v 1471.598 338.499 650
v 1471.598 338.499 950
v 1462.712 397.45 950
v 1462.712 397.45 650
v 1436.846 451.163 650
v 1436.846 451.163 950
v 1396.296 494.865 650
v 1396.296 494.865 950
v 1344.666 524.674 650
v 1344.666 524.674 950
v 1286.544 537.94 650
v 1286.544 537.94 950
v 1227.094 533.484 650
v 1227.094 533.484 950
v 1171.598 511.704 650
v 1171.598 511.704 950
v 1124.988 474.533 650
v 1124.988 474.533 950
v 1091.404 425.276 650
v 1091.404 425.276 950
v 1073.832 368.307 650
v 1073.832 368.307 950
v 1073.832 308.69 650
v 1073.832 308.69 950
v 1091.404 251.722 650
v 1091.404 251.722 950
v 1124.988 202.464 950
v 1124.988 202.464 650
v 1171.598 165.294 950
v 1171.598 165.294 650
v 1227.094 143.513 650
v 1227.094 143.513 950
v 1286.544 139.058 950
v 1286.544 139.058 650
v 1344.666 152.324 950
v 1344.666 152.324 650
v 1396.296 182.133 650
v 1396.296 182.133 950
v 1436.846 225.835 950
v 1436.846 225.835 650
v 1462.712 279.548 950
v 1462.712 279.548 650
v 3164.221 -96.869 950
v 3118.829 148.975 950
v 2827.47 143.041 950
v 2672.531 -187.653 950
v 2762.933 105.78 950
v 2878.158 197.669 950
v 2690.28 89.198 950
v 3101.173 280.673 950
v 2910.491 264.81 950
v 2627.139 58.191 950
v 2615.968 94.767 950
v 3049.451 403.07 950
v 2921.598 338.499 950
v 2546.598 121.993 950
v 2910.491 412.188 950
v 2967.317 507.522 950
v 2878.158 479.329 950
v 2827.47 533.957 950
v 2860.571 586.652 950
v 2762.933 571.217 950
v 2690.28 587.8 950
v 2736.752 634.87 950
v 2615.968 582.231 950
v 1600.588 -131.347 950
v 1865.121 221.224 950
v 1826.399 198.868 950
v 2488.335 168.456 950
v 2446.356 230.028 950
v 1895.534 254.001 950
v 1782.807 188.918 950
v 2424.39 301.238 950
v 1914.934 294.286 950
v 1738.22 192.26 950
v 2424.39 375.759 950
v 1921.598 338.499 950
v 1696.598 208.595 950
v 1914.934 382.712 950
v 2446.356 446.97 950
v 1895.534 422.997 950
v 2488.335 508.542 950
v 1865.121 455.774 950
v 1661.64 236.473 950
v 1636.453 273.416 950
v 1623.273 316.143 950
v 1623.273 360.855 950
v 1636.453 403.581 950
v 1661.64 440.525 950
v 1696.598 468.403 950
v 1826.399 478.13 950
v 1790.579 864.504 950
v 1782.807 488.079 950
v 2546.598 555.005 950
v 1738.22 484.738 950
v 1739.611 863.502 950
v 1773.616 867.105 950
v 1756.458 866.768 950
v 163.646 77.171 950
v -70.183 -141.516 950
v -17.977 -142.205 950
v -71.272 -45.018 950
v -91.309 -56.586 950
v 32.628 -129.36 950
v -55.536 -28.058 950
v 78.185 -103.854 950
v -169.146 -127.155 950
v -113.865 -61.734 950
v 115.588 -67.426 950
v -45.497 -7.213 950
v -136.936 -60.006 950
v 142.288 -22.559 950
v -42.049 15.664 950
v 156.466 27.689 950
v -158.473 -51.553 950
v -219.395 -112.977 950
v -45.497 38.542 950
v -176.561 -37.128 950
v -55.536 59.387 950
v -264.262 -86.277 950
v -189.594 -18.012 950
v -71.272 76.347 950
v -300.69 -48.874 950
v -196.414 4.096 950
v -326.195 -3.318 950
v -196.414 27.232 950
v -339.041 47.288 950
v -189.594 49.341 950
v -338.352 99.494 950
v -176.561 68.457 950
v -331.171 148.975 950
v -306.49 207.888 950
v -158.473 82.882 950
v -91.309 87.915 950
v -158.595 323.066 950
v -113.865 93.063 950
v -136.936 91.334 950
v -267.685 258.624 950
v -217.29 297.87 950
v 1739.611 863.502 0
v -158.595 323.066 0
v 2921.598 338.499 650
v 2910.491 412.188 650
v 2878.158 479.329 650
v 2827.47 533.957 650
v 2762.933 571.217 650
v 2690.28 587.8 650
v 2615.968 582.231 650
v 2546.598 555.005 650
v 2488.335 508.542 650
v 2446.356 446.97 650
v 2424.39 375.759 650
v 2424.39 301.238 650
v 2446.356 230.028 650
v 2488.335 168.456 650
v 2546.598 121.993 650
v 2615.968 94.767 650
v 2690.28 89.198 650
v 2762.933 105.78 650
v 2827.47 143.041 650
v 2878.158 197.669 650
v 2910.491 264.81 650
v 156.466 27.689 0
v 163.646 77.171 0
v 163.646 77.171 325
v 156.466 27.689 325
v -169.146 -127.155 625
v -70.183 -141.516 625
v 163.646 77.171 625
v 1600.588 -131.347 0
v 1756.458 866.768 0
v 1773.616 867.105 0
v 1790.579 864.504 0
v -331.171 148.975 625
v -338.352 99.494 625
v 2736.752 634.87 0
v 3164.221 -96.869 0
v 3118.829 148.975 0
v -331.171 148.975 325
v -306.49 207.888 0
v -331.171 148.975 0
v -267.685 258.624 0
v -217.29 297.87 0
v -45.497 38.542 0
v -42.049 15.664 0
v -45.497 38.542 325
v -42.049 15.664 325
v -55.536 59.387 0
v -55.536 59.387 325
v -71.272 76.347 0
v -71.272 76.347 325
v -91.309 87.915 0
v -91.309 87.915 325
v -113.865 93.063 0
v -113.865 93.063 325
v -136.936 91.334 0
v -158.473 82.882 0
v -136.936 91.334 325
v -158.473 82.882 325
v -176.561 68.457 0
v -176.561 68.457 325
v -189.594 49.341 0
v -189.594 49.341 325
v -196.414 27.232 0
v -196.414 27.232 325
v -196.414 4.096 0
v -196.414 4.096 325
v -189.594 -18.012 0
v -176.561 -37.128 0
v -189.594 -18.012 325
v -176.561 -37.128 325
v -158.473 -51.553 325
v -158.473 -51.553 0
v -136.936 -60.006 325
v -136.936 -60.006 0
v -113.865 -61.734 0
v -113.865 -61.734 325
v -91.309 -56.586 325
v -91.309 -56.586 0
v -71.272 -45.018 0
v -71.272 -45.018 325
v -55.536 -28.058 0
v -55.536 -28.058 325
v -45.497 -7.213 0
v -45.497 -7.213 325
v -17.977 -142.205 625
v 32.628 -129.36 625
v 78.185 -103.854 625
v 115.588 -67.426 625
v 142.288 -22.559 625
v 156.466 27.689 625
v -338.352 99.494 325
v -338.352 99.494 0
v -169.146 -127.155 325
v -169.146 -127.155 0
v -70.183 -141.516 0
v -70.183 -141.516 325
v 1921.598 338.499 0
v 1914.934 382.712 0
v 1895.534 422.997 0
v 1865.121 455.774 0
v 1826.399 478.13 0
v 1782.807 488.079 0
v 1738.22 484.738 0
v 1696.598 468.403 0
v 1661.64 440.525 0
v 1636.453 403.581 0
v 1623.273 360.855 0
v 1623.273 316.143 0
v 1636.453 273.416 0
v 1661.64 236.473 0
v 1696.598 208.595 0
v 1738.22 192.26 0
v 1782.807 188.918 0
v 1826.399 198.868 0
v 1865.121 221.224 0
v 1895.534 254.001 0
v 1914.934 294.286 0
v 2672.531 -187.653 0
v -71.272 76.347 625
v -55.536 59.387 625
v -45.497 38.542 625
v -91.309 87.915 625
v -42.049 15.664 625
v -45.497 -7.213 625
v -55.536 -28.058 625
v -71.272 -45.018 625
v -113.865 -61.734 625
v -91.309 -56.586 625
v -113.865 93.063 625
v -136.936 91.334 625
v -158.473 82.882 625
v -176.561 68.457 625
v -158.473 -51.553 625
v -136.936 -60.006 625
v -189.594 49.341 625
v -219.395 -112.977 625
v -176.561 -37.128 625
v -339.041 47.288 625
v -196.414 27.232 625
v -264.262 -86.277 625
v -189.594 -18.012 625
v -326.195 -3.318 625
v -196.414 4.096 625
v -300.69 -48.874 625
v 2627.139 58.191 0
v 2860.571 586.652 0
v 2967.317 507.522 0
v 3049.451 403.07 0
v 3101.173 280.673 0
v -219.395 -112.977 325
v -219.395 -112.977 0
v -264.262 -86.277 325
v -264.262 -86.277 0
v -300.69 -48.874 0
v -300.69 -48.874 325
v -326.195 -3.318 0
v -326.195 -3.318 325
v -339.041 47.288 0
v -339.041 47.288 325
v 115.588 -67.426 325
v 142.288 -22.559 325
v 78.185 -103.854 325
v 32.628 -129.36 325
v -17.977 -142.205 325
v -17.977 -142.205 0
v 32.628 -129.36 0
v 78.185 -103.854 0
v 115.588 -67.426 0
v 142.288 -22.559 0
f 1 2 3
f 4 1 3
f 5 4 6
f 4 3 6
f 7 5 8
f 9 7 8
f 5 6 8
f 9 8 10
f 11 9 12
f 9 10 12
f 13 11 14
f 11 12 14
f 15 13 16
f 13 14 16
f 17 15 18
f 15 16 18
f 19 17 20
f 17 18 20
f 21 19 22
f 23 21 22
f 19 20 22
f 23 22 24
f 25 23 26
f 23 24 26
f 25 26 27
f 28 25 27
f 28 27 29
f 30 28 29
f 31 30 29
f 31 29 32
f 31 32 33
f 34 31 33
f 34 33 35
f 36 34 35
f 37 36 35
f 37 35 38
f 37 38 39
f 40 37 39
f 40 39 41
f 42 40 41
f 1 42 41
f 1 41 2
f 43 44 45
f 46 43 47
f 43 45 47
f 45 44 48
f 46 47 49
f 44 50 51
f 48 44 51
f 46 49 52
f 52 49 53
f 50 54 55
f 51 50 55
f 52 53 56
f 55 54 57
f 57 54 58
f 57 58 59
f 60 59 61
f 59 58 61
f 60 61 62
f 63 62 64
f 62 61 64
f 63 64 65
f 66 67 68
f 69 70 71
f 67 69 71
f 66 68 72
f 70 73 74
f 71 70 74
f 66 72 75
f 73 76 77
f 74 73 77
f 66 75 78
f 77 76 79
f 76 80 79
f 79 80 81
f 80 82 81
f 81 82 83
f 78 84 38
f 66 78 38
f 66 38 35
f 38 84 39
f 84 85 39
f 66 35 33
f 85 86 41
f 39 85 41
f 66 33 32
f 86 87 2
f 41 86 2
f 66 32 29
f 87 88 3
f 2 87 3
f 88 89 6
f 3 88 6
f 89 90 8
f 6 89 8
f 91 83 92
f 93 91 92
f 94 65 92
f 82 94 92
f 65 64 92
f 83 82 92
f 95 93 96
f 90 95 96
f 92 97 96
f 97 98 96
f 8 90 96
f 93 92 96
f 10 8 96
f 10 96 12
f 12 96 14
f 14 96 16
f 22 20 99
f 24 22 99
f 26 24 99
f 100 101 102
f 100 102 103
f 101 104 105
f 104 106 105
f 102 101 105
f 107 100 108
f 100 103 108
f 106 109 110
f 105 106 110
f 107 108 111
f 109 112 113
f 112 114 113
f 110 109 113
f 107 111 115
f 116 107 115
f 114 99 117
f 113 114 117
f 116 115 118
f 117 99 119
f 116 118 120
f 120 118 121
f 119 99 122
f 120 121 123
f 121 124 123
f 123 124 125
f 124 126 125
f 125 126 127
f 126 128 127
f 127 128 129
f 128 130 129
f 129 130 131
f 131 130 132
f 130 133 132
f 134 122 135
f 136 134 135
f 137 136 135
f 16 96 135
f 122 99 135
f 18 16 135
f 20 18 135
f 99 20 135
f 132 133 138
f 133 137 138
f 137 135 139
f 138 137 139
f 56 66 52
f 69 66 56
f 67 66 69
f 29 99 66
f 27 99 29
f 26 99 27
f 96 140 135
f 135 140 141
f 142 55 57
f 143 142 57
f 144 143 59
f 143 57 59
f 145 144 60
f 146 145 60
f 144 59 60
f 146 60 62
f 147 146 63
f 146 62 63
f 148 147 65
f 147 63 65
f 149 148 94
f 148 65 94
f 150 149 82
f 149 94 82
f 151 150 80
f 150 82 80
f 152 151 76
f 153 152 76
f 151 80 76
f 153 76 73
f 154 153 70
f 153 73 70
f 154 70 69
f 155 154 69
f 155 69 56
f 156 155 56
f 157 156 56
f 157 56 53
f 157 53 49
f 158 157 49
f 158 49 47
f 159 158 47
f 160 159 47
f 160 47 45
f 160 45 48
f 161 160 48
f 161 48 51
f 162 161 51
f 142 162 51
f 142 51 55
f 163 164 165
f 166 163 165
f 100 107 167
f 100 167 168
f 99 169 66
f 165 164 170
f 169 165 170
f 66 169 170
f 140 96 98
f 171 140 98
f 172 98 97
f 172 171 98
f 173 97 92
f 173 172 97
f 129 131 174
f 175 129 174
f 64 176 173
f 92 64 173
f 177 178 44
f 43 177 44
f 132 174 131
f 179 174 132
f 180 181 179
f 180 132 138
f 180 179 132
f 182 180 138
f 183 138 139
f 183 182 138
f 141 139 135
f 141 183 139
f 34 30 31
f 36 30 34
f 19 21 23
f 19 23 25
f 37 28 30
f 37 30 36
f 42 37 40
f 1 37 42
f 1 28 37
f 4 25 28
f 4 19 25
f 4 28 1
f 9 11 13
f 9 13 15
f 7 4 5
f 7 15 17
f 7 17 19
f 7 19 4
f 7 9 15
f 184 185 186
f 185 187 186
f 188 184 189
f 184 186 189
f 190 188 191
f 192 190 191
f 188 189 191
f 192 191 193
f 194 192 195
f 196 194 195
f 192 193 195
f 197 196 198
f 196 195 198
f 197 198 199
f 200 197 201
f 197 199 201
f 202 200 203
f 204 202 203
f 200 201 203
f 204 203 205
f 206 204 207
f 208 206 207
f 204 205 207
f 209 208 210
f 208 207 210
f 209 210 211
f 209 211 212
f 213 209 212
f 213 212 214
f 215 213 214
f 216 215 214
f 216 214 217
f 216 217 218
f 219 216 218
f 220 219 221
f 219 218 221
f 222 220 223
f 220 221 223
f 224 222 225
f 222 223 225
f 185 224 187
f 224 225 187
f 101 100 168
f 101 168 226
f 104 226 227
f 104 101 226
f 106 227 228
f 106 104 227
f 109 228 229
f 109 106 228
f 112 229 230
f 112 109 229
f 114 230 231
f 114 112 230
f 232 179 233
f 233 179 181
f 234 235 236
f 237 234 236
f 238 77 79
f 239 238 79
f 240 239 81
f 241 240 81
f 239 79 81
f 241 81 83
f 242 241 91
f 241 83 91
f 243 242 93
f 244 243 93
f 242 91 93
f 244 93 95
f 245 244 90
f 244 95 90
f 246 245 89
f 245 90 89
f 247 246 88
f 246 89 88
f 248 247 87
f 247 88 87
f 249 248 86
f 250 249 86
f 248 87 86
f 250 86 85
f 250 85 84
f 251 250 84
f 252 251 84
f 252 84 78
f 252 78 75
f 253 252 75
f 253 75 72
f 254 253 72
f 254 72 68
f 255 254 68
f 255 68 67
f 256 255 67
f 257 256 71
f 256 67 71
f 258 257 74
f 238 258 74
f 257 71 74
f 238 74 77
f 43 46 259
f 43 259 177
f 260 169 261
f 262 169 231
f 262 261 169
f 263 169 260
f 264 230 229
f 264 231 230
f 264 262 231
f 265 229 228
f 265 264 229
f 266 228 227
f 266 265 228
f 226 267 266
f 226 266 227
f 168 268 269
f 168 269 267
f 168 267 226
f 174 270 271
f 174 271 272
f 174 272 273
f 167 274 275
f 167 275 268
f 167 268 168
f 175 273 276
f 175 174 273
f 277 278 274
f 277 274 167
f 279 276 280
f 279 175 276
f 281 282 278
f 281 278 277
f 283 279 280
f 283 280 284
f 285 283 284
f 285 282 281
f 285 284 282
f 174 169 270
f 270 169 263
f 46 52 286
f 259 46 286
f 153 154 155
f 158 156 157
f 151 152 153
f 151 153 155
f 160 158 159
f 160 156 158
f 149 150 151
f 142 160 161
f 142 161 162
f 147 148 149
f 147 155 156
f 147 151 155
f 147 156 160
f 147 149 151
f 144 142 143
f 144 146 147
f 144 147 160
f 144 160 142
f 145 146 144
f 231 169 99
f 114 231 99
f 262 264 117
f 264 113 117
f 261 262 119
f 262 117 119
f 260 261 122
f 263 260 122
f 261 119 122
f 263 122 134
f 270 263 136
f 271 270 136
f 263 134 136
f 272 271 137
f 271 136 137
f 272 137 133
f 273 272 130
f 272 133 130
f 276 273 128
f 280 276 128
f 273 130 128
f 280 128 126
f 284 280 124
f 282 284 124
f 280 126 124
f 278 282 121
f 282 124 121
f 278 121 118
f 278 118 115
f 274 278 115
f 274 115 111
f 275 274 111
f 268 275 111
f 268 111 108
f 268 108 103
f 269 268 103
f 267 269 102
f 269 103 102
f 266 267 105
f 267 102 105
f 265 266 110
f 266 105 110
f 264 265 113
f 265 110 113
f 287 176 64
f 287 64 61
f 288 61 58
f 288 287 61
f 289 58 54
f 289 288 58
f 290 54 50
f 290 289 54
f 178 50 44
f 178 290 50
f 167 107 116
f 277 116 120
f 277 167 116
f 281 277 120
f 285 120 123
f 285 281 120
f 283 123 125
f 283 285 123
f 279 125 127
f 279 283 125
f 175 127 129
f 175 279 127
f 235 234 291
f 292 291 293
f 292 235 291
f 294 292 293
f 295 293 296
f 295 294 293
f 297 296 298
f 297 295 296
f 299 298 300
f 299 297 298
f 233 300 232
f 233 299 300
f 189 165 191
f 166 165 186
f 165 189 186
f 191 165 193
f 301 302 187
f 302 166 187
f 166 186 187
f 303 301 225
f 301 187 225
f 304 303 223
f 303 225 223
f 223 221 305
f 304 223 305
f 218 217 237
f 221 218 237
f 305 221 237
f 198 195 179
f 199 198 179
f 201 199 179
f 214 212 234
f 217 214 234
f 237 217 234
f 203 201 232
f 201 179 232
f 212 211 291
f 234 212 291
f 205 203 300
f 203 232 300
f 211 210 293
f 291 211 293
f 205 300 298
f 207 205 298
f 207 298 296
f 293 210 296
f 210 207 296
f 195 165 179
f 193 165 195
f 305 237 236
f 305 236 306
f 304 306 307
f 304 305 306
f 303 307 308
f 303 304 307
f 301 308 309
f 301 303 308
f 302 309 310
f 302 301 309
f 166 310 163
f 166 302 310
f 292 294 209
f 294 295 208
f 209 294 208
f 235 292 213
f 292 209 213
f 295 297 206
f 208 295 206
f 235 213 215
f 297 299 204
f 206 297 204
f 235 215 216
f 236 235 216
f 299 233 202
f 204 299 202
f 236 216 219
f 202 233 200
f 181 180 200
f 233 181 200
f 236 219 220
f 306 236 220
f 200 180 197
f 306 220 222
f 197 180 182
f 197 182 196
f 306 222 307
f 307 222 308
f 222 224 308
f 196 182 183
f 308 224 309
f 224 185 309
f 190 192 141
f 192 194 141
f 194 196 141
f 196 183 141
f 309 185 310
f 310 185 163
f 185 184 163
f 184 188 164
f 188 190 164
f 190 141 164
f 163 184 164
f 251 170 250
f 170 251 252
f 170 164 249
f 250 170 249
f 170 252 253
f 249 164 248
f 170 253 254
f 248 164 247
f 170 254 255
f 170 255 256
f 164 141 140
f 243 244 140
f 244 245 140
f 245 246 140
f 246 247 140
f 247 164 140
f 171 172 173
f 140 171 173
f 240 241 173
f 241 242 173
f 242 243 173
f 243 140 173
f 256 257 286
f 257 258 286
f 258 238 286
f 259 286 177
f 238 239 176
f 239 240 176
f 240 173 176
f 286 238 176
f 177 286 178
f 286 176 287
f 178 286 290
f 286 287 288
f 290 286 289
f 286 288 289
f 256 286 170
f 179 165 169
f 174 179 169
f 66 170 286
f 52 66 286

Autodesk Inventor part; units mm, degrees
ref_plane "YZ Plane" through (0, 0, 0) normal (1, 0, 0) x (0, 1, 0)
ref_plane "XZ Plane" through (0, 0, 0) normal (0, 1, 0) x (-1, 0, 0)
ref_plane "XY Plane" through (0, 0, 0) normal (0, 0, 1) x (1, 0, 0)
sketch "Skizze1" plane through (0, 0, 0) normal (0, 0, 1) x (1, 0, 0)
  arc A0 (3118.8287, 148.9752) -> (2736.7523, 634.8703) centre (2618.8287, 148.9752) ccw
  line L0 (2736.7523, 634.8703) -> (1790.5787, 864.5036)
  line L1 (1739.6109, 863.5025) -> (-158.5948, 323.0655)
  arc A1 (-158.5948, 323.0655) -> (-331.1713, 148.9752) centre (-90.1379, 82.6208) ccw
  arc A2 (1765.4752, 870.5961) -> (1764.4558, 870.5761) centre (1765.0035, 868.6526) ccw
  arc A3 (1790.5787, 864.5036) -> (1739.6109, 863.5025) centre (1766.9937, 767.3247) ccw
  line L2 (-331.1713, 148.9752) -> (1600.5878, -131.3474)
  line L3 (1600.5878, -131.3474) -> (3118.8287, 148.9752)
  point P0 (0, 0)
  point P1 (1764.9629, 870.7205)
  dimension "d1" = 1000
  dimension "d2" = 2000
  dimension "d3" = 500
  dimension "d4" = 250
extrude "Extrusion1" add sketch "Skizze1" along normal blind 950
sketch "Skizze2" plane through (3118.8287, 148.9752, 0) normal (0.1815675, -0.9833785, 0) x (0.9833785, 0.1815675, 0)
  line L0 (-1543.9029, 950) -> (0, 950) construction
  line L1 (-1543.9029, 0) -> (0, 0) construction
  line L2 (0, 950) -> (-500, 950)
  line L3 (-500, 950) -> (-500, 0)
  line L4 (-500, 0) -> (0, 0)
  line L5 (0, 0) -> (0, 950)
  line L6 (-3191.3386, 950) -> (-3392.6558, 950) projected
  line L7 (-1226.5582, 0) -> (-3191.3386, 0) construction
  line L8 (-3392.6558, 950) -> (-2892.6558, 950)
  line L9 (-2892.6558, 950) -> (-2892.6558, 0)
  line L10 (-2892.6558, 0) -> (-3392.6558, 0)
  line L11 (-3392.6558, 0) -> (-3392.6558, 950)
  point P0 (-3094.0381, 0)
  dimension "d16" = 500
  dimension "d17" = 500
extrude "Extrusion2" add sketch "Skizze2" along normal blind 250 contours L5 L4 L3 L2
sketch "Skizze3" plane through (1600.5878, -131.3474, 0) normal (-0.1436085, -0.9896346, 0) x (0.9896346, -0.1436085, 0)
  line L0 (-1951.9923, 0) -> (0, 0) construction
  line L1 (-1951.9923, 950) -> (0, 950) construction
  line L2 (-1951.9923, 0) -> (-1451.9923, 0)
  line L3 (-1451.9923, 0) -> (-1451.9923, 950)
  line L4 (-1451.9923, 950) -> (-1951.9923, 950)
  line L5 (-1951.9923, 950) -> (-1951.9923, 0)
  point P0 (-1602.8597, 0)
  dimension "d20" = 500
extrude "Extrusion3" add sketch "Skizze3" along normal blind 250
sketch "Skizze4" plane through (-331.1713, 148.9752, 0) normal (-0.9896346, 0.1436085, 0) x (0, 0, 1)
  line L0 (0, 0) -> (0, 197.0692) construction
  line L1 (950, 0) -> (950, -250) projected
  line L2 (0, 0) -> (950, 0)
  line L3 (950, 0) -> (950, -250)
  line L4 (950, -250) -> (0, -250)
  line L5 (0, -250) -> (0, 0)
  point P0 (0, -99.872)
sketch "Skizze5" plane through (0, 0, 950) normal (0, 0, 1) x (1, 0, 0)
  line L0 (163.646, 77.171) -> (1600.5878, -131.3474) construction
  line L1 (1600.5878, -131.3474) -> (2100.5878, -131.3474) construction
  circle A0 centre (1771.5979, 338.4989) radius 150
  point P0 (0, 0)
  dimension "d25" = 300
extrude "Extrusion4" cut sketch "Skizze5" against normal through all
sketch "Skizze6" plane through (0, 0, 950) normal (0, 0, 1) x (1, 0, 0)
  circle A0 centre (-119.6648, 15.6644) radius 77.6159
  point P0 (0, 0)
extrude "Extrusion5" cut sketch "Skizze6" against normal through all
sketch "Skizze7" plane through (-331.1713, 148.9752, 0) normal (-0.9896346, 0.1436085, 0) x (0, 0, 1)
  point P0 (0, -99.872)
sketch "Skizze8" plane through (-331.1713, 148.9752, 0) normal (-0.9896346, 0.1436085, 0) x (0, 0, 1)
  line L0 (950, 0) -> (0, 0) construction
  line L1 (0, -250) -> (950, -250) construction
  line L2 (475, 0) -> (625, 0)
  line L3 (625, 0) -> (625, -250)
  line L4 (625, -250) -> (475, -250)
  line L5 (475, -250) -> (475, 0)
  line L6 (475, 0) -> (325, 0)
  line L7 (325, 0) -> (325, -250)
  line L8 (325, -250) -> (475, -250)
  line L9 (475, -250) -> (475, 0)
  point P0 (0, -99.872)
  dimension "d31" = 150
  dimension "d32" = 150
extrude "Extrusion6" cut sketch "Skizze8" against normal through all
fillet "Rundung1" radius 200 4 edges at (-367.0734, -98.4335, 787.5) (-367.0734, -98.4335, 162.5) (127.7439, -170.2377, 162.5) (127.7439, -170.2377, 787.5)
sketch "Skizze9" plane through (0, 0, 950) normal (0, 0, 1) x (1, 0, 0)
  circle A0 centre (1271.5979, 338.4989) radius 200
  point P0 (0, 0)
  dimension "d37" = 400
extrude "Extrusion7" cut sketch "Skizze9" against normal blind 300
sketch "Skizze10" plane through (0, 0, 950) normal (0, 0, 1) x (1, 0, 0)
  circle A0 centre (2671.5979, 338.4989) radius 250
  point P0 (0, 0)
  dimension "d41" = 500
extrude "Extrusion8" cut sketch "Skizze10" against normal blind 300
properties part number "Bauteil 2 geändert"
